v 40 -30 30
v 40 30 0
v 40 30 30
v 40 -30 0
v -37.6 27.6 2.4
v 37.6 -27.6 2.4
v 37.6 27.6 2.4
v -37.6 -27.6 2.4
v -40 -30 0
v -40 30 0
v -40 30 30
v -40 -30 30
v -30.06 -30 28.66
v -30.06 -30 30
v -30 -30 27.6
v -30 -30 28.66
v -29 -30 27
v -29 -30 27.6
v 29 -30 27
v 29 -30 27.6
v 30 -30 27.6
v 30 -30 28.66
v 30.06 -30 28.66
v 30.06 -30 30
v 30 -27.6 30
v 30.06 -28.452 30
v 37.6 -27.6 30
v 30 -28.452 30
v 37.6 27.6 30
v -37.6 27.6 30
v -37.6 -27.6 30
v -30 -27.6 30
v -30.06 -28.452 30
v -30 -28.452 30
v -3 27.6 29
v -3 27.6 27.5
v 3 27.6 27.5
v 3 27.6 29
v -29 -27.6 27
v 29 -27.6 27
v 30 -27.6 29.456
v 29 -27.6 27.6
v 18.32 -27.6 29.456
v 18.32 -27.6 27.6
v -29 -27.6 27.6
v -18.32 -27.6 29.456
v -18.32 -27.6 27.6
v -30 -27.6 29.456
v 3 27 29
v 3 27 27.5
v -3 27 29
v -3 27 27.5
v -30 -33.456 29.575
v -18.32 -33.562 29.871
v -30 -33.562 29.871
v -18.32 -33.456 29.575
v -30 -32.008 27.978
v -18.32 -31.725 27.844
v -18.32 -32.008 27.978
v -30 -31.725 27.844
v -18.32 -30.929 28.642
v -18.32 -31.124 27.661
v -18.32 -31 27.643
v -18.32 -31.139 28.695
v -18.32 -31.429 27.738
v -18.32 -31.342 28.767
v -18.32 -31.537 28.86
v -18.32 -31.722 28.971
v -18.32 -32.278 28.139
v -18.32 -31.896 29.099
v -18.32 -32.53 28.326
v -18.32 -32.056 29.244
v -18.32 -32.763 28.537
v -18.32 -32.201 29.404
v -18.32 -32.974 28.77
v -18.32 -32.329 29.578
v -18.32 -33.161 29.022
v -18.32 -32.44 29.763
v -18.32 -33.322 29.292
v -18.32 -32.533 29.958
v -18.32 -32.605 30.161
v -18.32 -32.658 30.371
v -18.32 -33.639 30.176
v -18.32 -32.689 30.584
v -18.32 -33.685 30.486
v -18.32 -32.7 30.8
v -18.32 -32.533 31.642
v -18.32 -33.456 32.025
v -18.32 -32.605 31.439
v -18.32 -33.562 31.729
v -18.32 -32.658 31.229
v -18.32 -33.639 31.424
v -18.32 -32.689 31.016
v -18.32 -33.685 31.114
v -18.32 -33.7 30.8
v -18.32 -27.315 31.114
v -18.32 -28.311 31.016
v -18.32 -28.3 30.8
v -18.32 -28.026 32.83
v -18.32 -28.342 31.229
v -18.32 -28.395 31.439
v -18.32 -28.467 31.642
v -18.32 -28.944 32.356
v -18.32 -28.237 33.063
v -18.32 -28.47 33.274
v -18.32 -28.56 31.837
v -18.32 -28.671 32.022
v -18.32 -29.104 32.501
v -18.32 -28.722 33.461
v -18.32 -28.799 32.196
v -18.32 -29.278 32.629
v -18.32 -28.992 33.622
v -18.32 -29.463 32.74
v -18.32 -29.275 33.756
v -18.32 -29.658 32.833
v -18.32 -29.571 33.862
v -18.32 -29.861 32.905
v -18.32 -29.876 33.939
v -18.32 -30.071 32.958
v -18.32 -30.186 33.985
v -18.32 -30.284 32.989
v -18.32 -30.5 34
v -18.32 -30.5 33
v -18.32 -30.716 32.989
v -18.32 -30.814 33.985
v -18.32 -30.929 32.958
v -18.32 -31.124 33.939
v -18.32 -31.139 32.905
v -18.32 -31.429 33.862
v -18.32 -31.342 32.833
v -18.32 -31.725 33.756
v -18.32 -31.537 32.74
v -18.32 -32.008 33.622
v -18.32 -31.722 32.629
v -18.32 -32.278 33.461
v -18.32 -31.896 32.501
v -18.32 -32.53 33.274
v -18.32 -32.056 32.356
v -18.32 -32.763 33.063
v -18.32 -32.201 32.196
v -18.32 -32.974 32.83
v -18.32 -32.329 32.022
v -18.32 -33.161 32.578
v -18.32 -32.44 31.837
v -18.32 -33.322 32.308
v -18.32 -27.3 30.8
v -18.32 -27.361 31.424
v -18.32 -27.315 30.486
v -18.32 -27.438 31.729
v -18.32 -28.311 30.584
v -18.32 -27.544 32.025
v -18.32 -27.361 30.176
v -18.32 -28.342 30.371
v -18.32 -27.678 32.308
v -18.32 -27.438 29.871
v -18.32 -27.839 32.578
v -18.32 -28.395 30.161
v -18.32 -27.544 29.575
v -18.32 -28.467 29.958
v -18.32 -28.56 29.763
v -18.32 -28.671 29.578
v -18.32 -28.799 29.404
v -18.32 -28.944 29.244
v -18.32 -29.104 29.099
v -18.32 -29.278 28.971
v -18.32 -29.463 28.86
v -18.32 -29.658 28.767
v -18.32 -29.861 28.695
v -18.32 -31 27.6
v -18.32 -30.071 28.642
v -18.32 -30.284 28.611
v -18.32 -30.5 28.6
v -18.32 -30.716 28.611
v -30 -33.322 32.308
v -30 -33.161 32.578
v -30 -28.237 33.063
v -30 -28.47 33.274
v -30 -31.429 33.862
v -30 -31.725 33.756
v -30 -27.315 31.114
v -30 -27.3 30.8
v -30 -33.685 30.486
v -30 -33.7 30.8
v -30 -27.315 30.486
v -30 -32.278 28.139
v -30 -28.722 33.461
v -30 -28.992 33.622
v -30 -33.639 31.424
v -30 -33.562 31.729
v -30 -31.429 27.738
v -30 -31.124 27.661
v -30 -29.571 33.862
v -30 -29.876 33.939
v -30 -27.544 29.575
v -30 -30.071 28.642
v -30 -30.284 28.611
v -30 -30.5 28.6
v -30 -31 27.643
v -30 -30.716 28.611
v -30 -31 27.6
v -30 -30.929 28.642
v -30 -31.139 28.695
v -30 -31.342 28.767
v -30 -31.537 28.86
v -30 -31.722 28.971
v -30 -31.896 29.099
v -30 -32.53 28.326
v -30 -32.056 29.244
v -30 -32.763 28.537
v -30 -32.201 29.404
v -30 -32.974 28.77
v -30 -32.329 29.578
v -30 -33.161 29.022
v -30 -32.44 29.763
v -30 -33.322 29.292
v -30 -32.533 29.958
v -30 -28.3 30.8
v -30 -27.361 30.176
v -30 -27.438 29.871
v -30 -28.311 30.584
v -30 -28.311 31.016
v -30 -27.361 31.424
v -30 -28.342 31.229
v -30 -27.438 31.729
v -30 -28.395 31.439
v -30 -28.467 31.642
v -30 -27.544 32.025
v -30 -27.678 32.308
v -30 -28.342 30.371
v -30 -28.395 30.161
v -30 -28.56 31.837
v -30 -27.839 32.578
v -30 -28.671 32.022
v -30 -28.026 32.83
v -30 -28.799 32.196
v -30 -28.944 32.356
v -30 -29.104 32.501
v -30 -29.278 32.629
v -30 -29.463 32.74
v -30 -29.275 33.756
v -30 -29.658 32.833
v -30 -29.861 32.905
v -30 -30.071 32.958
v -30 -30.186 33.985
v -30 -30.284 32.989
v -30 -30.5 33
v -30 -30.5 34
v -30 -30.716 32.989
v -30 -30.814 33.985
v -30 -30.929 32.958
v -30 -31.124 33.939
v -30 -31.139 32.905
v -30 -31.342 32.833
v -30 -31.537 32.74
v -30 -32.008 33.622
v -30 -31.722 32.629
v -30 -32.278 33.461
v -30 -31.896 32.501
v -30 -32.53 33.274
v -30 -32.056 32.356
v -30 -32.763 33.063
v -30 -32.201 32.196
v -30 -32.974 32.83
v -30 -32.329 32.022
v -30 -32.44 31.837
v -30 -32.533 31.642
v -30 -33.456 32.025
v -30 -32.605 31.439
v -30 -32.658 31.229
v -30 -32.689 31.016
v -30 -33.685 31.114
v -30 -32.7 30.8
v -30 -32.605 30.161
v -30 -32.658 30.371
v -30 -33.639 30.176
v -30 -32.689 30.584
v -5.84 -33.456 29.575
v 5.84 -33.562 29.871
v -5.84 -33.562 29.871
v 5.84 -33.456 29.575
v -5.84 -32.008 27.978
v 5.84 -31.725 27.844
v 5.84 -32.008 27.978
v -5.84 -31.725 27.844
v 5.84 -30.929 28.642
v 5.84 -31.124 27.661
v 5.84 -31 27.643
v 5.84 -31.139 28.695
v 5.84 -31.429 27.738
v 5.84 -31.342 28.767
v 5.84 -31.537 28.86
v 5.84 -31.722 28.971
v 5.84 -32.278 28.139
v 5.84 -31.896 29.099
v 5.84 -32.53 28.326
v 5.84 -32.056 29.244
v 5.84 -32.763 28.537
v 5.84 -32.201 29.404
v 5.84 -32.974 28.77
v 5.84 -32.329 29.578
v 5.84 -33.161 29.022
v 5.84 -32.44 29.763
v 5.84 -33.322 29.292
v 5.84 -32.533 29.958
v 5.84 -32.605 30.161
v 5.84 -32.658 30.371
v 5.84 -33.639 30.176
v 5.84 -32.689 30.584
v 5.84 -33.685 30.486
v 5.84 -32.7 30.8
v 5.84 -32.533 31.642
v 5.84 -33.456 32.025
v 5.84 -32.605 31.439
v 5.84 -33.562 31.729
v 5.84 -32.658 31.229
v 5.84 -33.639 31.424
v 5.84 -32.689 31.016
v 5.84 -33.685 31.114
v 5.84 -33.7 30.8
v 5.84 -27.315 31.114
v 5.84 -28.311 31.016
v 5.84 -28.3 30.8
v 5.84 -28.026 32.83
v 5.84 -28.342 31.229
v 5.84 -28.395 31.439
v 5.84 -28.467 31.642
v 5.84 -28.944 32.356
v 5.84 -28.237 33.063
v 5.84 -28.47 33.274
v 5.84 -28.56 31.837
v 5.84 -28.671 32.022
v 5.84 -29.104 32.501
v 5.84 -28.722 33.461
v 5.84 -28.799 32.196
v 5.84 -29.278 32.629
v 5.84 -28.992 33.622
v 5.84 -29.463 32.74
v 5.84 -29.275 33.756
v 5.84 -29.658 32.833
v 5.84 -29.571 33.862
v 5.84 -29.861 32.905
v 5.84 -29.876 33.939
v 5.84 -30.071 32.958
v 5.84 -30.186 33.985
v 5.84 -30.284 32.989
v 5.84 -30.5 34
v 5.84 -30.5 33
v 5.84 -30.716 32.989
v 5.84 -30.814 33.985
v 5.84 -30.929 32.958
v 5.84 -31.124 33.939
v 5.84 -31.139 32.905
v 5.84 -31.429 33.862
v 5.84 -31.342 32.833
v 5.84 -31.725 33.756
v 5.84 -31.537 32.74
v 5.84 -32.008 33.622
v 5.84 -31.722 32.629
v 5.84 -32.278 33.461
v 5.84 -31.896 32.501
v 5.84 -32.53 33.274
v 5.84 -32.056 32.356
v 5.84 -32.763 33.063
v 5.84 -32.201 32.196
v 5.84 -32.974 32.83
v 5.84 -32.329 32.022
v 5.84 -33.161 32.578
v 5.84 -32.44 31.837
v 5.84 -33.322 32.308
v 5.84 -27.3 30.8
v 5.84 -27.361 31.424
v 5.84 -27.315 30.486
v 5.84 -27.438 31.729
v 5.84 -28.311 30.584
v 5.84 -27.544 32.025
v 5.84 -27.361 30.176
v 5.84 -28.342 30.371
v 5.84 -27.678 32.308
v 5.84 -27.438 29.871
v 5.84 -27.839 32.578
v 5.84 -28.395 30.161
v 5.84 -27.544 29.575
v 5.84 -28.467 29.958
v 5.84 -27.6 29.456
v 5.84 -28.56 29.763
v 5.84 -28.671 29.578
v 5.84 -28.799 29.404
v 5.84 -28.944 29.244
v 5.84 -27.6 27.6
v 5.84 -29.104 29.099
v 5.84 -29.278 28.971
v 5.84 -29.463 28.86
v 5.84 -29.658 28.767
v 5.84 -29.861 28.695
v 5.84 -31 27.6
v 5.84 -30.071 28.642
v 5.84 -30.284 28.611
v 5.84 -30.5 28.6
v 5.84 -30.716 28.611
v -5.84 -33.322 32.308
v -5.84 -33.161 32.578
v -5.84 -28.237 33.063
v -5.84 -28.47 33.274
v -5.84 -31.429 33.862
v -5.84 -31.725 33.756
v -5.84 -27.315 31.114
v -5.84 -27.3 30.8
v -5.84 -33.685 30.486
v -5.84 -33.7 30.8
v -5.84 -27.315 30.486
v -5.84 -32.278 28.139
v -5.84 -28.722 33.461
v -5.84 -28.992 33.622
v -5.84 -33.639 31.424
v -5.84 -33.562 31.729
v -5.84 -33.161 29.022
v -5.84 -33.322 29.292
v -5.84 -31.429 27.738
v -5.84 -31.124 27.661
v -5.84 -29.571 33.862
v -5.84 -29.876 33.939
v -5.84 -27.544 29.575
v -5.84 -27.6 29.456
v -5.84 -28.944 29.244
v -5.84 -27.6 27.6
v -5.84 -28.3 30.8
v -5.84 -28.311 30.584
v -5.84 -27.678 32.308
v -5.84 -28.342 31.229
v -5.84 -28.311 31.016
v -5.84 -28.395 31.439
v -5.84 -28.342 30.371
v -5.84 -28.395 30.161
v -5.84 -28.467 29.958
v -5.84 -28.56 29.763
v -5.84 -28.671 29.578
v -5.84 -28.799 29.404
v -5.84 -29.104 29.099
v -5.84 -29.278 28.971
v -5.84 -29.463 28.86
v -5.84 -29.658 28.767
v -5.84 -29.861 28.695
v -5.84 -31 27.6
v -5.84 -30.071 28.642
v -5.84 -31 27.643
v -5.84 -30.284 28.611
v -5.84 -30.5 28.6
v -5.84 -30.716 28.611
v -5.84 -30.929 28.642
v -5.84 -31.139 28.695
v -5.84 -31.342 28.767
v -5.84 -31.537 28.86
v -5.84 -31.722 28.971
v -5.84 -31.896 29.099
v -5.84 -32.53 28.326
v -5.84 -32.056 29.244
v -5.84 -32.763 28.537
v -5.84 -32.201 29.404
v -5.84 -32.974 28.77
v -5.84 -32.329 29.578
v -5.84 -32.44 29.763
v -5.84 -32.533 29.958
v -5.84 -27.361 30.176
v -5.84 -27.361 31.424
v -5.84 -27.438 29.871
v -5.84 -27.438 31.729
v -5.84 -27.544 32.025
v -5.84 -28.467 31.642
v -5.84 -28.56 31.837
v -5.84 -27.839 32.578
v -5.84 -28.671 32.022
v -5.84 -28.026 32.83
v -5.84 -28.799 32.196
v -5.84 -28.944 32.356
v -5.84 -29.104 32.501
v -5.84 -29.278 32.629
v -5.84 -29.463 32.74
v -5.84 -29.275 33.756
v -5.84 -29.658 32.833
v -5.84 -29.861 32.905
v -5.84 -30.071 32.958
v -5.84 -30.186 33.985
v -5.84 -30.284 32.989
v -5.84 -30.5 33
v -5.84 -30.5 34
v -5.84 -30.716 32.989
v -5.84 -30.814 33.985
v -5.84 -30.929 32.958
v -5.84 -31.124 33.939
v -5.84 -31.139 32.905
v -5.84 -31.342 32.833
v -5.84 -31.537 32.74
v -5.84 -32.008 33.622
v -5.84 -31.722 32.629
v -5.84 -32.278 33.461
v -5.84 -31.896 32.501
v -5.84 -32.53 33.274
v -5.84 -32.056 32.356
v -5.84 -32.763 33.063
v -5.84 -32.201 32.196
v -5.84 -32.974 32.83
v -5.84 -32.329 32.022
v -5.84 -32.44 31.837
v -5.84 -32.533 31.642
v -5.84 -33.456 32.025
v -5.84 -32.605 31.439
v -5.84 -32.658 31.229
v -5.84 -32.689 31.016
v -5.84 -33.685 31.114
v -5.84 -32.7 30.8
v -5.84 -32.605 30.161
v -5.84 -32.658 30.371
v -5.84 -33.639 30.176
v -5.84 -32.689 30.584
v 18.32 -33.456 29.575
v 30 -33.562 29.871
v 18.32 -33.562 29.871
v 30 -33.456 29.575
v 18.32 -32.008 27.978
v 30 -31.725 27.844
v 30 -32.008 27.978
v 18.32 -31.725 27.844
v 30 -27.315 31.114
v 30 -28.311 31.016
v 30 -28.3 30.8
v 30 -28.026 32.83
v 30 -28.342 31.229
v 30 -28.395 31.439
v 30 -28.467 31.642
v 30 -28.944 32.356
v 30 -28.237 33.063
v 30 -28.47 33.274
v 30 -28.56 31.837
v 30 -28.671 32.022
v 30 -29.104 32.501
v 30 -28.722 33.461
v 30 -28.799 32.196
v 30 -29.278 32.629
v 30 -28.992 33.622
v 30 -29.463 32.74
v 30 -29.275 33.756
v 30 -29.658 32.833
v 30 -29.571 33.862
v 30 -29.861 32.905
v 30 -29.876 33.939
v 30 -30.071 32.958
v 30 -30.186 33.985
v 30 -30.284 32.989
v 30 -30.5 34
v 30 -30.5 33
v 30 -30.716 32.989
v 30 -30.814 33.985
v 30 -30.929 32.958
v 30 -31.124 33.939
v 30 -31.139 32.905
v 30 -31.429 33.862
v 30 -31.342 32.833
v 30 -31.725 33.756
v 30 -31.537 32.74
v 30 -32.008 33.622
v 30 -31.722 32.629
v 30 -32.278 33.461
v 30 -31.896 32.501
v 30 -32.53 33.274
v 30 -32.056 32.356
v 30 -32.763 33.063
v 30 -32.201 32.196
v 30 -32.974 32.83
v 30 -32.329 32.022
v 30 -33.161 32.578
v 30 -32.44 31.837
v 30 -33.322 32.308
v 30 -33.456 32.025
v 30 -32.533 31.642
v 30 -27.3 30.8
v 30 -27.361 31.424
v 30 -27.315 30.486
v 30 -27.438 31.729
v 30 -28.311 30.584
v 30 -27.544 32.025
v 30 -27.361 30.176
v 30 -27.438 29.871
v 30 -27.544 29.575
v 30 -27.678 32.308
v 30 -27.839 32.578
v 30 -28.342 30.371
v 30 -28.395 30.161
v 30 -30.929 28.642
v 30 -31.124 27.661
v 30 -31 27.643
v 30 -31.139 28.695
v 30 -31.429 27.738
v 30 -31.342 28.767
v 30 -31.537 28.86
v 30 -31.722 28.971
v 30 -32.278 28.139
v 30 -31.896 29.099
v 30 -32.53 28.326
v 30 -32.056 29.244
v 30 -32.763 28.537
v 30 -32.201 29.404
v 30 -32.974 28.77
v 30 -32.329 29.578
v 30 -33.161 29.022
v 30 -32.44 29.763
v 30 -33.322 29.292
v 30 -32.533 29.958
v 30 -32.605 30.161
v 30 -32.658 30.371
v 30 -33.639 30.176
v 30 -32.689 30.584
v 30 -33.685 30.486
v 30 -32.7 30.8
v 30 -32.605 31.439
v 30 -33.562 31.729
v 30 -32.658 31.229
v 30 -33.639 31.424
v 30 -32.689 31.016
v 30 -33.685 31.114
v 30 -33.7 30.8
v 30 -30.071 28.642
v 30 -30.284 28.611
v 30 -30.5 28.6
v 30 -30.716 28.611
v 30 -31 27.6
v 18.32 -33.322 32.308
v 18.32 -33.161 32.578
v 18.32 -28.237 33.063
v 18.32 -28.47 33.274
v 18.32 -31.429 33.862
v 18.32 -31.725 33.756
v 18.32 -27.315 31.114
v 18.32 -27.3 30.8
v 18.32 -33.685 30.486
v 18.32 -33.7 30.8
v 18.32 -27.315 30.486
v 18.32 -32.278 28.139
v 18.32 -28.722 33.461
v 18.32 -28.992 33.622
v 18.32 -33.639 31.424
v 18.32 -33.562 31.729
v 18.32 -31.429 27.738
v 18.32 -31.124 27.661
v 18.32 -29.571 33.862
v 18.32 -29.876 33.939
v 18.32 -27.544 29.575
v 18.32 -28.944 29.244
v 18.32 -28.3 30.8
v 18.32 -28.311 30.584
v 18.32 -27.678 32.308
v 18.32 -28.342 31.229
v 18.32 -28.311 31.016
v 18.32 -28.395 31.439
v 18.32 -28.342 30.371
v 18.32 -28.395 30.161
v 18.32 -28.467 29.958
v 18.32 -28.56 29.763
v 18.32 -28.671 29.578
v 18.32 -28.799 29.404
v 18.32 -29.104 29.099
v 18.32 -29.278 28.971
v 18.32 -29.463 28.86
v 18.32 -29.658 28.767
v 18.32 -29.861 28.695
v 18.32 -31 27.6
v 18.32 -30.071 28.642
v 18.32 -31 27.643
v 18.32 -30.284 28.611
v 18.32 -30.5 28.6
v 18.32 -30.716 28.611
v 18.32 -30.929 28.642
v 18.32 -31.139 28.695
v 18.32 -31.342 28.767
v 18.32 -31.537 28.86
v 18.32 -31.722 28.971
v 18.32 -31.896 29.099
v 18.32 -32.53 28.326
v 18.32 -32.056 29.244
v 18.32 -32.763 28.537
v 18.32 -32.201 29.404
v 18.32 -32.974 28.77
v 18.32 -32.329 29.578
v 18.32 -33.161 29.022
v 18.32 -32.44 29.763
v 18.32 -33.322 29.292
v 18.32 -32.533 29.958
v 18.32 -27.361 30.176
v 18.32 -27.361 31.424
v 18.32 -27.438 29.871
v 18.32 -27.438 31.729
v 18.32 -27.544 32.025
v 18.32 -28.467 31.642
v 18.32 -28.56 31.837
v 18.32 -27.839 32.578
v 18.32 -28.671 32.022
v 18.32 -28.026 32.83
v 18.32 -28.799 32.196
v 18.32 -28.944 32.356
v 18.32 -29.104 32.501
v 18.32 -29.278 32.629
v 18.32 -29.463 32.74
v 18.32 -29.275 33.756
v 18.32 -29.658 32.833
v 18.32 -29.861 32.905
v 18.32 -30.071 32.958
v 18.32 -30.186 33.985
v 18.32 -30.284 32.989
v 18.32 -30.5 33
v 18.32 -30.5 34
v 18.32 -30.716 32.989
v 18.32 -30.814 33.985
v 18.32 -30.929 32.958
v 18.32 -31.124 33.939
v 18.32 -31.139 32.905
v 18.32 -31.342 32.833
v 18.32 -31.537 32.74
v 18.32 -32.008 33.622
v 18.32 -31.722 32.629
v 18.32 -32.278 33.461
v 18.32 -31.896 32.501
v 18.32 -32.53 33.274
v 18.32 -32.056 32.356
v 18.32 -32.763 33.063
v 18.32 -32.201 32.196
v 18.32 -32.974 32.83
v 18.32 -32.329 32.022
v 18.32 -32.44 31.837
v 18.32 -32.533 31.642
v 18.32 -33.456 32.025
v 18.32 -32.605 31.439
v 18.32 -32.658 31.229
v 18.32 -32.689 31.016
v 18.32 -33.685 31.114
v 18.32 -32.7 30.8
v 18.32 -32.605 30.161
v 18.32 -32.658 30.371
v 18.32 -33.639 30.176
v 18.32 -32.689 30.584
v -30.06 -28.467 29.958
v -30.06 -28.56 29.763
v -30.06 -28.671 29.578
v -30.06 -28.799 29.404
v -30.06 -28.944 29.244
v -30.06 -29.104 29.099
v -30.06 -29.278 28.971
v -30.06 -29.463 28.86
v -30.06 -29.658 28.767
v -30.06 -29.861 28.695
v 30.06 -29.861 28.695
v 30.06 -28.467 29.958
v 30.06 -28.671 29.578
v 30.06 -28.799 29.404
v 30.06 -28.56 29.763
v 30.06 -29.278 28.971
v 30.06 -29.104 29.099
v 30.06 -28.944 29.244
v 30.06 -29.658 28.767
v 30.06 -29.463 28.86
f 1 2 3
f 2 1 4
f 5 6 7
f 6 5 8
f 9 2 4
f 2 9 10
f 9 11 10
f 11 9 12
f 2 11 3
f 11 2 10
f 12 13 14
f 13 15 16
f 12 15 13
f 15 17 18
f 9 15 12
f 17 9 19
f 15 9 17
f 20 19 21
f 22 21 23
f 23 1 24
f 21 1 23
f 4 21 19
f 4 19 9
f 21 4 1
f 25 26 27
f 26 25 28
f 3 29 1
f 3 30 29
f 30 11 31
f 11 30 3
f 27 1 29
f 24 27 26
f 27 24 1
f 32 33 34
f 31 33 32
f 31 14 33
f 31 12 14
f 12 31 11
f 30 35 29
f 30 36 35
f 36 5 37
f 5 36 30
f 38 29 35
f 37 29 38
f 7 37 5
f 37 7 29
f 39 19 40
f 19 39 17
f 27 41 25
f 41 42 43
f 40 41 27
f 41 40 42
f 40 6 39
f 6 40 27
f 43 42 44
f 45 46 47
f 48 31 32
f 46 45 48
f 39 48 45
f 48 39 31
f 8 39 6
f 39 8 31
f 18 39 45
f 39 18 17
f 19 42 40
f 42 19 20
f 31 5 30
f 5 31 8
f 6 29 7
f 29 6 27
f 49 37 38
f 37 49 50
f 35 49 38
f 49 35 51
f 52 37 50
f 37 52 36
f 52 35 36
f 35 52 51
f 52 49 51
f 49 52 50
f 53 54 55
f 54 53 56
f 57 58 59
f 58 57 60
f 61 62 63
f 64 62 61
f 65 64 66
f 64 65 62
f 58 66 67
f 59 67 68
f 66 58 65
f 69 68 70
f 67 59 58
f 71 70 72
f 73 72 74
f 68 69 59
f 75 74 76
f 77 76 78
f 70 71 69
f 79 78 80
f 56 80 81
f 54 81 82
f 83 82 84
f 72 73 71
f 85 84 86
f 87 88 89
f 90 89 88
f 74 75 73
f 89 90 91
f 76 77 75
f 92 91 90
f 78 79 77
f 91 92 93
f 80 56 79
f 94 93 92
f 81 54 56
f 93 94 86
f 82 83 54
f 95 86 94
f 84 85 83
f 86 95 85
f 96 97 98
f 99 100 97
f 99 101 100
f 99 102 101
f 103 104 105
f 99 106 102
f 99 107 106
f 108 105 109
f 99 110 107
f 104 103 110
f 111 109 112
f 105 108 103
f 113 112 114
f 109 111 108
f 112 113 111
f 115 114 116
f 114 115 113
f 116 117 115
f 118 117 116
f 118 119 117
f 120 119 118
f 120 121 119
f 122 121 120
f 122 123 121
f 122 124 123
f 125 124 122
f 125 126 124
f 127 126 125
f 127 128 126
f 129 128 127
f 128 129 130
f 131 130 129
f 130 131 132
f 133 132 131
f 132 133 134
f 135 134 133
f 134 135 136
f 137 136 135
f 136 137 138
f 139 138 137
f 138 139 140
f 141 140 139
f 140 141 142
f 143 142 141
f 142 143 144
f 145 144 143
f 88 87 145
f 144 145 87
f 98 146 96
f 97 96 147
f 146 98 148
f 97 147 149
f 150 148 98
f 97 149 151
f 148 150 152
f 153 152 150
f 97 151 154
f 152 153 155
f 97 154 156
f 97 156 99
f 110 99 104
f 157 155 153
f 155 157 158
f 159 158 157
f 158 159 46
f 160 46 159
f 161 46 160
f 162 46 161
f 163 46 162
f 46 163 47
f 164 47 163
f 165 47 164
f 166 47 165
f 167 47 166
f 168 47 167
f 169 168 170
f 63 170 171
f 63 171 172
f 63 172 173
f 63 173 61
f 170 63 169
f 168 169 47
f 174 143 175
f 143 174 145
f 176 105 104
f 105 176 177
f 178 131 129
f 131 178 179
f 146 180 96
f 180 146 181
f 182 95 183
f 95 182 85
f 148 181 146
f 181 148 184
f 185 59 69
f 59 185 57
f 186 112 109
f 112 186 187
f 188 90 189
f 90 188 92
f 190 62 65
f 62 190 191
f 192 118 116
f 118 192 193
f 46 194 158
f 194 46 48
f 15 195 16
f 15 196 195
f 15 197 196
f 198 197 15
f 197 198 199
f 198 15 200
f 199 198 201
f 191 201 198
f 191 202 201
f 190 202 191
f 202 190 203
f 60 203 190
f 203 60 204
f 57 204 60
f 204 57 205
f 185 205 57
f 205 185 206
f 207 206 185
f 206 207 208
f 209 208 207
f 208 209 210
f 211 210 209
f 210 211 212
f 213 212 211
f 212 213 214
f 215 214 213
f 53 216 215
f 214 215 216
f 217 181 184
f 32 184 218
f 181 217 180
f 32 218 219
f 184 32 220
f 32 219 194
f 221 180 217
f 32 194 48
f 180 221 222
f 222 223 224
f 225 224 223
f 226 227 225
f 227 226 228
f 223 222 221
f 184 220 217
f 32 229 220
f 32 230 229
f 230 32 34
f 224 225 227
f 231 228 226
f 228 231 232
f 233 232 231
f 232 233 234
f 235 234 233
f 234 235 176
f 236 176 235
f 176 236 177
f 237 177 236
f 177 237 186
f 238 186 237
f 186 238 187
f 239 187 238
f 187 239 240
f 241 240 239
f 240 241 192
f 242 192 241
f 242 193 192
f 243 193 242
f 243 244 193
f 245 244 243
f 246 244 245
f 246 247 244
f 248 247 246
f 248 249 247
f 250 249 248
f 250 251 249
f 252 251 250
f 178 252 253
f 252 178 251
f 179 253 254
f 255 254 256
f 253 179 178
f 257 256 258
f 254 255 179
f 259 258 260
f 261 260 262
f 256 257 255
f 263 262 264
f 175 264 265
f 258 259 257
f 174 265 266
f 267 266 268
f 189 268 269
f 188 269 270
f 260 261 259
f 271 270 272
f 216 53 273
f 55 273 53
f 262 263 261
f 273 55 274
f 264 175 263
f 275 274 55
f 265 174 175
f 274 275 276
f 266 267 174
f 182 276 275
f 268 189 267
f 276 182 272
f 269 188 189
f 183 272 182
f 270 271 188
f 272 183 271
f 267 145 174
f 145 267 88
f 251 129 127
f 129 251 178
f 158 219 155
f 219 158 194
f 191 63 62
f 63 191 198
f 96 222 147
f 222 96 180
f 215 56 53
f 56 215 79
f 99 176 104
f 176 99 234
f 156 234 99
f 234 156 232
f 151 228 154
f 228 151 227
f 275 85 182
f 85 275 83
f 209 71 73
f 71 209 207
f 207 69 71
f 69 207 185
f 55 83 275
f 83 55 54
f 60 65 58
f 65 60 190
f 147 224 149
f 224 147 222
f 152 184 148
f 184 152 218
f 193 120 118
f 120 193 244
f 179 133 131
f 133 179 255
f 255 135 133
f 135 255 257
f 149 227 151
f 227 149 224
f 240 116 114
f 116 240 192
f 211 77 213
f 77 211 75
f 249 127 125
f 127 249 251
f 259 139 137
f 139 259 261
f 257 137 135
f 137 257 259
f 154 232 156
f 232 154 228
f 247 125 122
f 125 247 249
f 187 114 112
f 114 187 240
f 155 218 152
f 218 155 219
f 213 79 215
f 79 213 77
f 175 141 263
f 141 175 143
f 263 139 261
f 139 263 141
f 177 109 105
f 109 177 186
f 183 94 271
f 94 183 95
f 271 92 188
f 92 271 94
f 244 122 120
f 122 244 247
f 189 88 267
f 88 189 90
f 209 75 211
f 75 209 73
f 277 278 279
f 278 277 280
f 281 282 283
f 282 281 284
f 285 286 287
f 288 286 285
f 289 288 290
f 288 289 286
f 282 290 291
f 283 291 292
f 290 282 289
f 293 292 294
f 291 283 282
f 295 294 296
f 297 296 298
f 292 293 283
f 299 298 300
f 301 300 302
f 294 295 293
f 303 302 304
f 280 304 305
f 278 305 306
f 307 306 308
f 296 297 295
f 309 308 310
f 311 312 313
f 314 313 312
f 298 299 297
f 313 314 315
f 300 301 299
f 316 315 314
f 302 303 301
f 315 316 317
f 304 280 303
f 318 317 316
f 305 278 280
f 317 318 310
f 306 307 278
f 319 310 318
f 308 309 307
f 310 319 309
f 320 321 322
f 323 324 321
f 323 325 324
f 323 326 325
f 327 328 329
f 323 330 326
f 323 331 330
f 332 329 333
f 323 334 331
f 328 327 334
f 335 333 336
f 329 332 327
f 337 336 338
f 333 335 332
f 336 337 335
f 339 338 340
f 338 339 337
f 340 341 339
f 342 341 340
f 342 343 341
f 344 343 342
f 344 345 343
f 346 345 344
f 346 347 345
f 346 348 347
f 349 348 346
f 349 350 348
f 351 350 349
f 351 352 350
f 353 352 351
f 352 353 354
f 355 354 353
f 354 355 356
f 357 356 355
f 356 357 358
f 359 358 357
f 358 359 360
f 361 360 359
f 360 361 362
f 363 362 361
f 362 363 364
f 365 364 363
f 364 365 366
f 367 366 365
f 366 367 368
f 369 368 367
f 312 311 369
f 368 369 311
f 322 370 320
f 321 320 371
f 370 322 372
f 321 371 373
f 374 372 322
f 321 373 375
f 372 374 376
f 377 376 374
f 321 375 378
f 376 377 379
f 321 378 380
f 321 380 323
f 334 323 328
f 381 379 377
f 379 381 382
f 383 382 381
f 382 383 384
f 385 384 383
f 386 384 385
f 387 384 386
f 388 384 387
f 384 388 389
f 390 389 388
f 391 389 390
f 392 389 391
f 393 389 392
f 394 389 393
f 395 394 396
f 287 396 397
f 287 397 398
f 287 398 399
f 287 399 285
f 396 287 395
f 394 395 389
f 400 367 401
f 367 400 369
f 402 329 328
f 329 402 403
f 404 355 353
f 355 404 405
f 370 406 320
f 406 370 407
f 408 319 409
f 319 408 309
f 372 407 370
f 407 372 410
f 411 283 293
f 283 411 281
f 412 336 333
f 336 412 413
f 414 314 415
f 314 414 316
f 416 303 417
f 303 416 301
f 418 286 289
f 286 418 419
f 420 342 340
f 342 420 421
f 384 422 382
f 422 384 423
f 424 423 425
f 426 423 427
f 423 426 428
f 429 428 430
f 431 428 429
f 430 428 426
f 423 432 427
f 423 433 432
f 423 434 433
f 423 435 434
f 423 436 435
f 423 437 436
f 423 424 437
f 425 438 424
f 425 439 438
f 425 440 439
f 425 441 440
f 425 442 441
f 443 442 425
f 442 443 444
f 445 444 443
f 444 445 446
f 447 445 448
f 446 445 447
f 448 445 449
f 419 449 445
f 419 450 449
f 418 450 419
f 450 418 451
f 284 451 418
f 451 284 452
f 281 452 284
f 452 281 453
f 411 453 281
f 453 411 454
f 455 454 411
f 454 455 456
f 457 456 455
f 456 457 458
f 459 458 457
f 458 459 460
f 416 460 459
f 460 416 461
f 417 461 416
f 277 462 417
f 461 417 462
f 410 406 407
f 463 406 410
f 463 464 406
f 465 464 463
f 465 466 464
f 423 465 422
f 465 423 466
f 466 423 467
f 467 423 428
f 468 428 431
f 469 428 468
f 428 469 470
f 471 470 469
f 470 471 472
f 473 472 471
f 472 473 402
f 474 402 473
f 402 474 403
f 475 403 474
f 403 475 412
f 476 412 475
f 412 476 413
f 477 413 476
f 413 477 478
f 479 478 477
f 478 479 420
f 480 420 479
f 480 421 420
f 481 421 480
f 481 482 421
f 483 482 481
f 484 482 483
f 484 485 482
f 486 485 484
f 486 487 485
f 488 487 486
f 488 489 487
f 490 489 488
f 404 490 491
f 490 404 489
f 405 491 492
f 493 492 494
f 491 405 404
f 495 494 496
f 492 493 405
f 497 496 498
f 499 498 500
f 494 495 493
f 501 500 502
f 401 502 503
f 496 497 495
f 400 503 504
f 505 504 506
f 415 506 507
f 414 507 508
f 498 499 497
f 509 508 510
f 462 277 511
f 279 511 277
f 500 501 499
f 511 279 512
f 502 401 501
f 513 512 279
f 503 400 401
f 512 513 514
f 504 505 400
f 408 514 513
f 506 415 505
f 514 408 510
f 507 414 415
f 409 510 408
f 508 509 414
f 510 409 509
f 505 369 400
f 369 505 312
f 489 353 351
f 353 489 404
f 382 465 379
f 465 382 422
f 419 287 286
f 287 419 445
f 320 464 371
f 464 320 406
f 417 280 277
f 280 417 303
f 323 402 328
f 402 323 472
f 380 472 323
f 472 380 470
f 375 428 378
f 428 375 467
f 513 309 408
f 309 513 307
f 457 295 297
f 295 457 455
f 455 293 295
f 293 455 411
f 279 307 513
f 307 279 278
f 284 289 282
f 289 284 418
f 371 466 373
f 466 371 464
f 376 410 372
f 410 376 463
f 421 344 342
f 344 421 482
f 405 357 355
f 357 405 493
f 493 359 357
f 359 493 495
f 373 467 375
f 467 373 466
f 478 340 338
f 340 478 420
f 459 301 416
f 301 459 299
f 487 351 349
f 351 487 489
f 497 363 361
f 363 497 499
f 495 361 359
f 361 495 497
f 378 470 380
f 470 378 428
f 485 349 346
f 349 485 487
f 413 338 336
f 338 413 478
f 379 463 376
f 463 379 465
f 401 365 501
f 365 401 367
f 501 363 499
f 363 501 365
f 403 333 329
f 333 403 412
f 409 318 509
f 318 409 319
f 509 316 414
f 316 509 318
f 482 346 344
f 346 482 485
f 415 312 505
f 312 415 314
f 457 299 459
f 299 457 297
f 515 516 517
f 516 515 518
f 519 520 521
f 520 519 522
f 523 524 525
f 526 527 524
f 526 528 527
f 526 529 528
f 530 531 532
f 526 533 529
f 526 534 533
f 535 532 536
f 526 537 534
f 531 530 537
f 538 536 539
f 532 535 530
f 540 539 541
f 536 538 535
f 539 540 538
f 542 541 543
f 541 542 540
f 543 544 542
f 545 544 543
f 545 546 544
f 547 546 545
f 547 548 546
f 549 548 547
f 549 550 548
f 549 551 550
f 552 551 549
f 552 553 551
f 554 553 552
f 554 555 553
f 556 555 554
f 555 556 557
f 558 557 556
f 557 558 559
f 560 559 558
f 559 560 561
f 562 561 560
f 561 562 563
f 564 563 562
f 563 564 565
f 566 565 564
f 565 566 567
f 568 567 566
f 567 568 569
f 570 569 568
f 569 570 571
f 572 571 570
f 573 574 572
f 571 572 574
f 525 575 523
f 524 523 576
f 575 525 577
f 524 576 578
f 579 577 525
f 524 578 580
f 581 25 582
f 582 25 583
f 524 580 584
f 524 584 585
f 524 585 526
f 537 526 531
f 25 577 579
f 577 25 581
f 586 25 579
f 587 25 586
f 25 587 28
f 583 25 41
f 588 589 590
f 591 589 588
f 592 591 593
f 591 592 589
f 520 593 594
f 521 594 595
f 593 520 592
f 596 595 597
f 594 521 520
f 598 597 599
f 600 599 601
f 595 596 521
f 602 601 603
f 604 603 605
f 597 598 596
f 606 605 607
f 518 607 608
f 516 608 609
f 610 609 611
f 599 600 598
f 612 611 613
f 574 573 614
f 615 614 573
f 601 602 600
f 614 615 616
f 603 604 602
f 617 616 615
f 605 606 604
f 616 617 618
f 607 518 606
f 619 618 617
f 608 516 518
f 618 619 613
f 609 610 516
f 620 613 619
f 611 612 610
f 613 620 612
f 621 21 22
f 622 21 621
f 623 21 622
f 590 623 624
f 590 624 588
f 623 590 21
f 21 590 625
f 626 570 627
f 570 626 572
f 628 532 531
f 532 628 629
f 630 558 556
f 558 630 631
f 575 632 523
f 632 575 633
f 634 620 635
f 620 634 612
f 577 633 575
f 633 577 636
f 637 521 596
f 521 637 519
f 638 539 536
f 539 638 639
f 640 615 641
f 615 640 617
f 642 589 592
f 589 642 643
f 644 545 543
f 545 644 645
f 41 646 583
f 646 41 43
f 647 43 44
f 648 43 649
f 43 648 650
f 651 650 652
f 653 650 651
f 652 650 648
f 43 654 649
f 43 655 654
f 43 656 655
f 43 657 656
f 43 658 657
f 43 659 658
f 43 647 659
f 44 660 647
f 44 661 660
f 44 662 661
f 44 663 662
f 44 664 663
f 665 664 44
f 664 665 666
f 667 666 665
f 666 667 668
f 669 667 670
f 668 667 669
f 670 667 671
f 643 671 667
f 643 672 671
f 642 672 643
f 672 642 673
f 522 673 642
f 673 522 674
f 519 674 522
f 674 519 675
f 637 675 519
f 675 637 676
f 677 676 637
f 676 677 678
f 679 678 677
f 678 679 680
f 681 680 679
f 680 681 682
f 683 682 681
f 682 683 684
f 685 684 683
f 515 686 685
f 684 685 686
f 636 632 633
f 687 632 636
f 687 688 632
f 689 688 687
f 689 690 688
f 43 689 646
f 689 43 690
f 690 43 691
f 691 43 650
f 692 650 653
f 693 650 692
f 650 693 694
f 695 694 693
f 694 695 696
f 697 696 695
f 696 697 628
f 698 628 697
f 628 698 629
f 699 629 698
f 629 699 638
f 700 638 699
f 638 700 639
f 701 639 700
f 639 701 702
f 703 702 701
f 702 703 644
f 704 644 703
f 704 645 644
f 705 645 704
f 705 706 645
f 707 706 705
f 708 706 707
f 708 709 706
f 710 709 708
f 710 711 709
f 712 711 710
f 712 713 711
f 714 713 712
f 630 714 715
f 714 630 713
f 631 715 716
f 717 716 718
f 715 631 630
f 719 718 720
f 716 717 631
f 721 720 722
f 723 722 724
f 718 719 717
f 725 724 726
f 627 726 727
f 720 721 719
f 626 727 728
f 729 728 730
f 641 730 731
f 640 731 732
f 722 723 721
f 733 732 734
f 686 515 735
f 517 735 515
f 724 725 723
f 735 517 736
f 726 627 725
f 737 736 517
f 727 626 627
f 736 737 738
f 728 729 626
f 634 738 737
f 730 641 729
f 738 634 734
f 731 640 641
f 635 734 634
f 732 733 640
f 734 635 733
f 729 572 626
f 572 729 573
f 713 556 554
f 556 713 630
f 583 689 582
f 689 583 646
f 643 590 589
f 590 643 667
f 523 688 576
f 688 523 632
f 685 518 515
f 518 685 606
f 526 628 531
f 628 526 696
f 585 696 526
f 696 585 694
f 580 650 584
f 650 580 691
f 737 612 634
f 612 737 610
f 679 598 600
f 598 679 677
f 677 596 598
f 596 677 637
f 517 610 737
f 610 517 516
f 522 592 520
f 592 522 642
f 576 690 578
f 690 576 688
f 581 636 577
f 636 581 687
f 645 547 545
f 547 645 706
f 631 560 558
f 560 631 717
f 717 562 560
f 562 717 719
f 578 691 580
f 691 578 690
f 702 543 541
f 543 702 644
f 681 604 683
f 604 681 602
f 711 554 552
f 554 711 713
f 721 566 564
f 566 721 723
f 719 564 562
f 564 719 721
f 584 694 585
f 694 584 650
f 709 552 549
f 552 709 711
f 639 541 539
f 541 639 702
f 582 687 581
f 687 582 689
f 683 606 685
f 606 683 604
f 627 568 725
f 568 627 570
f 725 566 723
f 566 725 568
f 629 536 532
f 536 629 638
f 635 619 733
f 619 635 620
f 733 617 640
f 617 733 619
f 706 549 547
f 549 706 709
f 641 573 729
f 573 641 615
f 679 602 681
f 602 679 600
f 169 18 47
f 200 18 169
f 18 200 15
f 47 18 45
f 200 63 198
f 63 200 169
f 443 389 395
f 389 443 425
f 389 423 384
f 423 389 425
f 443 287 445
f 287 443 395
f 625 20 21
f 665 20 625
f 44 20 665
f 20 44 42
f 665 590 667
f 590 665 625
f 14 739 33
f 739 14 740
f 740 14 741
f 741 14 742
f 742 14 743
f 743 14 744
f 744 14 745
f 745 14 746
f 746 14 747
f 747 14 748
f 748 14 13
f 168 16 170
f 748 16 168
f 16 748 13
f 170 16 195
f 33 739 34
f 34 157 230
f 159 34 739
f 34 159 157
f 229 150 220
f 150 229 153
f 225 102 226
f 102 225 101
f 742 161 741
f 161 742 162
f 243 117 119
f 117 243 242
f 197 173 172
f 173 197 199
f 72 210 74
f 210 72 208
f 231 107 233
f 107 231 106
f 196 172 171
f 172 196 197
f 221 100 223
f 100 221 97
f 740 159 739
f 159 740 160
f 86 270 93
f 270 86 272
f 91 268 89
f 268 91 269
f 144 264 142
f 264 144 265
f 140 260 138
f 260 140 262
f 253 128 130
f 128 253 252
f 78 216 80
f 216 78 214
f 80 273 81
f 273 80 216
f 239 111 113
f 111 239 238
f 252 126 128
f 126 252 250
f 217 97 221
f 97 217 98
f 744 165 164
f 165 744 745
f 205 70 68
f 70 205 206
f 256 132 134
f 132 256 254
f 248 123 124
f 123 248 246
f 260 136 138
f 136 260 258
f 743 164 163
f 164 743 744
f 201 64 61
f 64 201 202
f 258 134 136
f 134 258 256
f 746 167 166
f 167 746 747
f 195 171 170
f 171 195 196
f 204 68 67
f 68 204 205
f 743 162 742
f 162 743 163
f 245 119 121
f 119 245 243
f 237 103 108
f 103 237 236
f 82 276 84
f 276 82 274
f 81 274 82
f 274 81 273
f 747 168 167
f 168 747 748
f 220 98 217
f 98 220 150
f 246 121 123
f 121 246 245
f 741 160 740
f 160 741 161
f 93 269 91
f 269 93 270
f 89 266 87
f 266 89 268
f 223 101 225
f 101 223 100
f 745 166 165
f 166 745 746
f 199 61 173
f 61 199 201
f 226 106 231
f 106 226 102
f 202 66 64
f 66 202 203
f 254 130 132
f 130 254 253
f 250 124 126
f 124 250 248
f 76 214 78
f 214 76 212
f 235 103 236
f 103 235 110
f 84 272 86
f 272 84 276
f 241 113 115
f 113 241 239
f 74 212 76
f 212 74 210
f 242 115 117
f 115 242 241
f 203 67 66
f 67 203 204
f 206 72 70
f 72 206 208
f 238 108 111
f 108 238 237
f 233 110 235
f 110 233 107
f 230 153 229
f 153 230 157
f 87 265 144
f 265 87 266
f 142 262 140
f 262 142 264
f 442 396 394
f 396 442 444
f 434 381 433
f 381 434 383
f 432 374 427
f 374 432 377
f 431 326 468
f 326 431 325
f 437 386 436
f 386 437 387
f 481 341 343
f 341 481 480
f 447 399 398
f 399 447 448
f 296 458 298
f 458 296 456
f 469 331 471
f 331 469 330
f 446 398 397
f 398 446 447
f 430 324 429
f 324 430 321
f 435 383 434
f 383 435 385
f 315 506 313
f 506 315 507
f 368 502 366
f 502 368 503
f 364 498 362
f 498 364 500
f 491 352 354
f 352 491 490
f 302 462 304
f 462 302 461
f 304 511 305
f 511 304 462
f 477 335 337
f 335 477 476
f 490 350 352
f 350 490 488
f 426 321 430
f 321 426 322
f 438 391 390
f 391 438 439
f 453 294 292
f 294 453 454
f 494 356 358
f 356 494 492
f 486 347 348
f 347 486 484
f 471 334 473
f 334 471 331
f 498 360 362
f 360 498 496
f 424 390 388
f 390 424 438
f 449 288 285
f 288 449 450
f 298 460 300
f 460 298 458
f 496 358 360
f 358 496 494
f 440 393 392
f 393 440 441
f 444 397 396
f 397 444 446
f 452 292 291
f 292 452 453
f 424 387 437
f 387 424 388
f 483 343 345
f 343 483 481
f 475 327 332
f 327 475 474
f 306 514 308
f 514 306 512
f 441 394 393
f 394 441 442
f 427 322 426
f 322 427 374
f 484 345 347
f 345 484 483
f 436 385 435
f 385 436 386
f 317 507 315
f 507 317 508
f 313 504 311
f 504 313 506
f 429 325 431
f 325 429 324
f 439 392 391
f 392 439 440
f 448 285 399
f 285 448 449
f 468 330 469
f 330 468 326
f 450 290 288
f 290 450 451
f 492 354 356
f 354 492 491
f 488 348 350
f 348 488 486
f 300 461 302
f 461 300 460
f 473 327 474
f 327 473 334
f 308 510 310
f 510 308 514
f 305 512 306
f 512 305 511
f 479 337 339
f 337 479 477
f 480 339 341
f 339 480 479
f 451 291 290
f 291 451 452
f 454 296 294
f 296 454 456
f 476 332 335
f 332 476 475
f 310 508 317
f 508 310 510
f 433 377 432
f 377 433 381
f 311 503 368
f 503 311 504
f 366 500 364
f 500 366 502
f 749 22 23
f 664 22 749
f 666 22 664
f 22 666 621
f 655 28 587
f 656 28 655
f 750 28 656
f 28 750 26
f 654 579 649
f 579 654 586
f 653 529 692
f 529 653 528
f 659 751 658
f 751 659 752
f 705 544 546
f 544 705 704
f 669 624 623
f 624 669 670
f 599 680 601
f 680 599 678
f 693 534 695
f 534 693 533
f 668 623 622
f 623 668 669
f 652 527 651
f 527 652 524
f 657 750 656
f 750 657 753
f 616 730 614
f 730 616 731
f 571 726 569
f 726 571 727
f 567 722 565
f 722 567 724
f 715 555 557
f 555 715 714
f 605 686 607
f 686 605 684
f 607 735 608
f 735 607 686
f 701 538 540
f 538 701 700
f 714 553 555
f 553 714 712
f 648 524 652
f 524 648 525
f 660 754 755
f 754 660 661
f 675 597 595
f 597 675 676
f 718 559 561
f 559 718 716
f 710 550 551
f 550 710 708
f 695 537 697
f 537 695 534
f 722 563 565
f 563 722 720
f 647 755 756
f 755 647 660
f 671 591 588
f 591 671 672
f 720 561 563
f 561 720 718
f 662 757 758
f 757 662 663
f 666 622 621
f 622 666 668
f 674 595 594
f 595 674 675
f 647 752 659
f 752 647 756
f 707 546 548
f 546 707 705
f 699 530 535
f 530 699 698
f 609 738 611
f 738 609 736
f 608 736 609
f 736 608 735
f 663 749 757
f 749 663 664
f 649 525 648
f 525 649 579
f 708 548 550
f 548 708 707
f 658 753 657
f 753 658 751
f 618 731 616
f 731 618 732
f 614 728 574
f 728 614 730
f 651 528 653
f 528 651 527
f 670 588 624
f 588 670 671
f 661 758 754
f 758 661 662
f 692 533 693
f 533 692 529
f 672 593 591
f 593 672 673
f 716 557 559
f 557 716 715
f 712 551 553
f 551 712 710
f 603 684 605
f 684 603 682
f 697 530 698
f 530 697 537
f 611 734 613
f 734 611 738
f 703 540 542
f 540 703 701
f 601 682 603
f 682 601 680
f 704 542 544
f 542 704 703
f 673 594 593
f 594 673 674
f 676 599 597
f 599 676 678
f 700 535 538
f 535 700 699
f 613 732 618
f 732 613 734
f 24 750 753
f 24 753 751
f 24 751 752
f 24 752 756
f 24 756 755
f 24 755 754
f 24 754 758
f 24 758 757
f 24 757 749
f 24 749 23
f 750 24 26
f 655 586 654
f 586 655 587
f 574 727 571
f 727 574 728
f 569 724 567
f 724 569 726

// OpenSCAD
// Box with print-in-place hinge (v3: global bore subtraction, hinge cutouts)
part = "box";
cadverify_only = "";
module instance(name, part, unit = 1) {
    echo(cadverify_instance = [name, part, unit]);
    if (cadverify_only == "" || cadverify_only == name) children();
}

Rkn = 3.2; rbore = 2.2; rpin = 1.9;
yh = -30.5; zh = 30.8;
lid_zh = 3.4;
lid_lift = 27.4;
pin_lift_z = 27.8; pin_shift_y = -30.5;
k0x0=-30; k0x1=-18.32;
k1x0=-17.92; k1x1=-6.24;
k2x0=-5.84; k2x1=5.84;
k3x0=6.24; k3x1=17.92;
k4x0=18.32; k4x1=30;

$fn = 64;

module xcyl(x0, x1, r, y, z) {
    translate([x0, y, z]) rotate([0, 90, 0]) cylinder(r = r, h = x1 - x0);
}

module box_part() {
    difference() {
        union() {
            translate([-40, -30, 0]) cube([80, 60, 2.4]);
            translate([-40, 27.6, 2.4]) cube([80, 2.4, 27.6]);
            translate([-40, -30, 2.4]) cube([80, 2.4, 24.6]);
            translate([-40, -30, 27.0]) cube([11, 2.4, 3.0]);
            translate([29, -30, 27.0]) cube([11, 2.4, 3.0]);
            translate([-40, -27.6, 2.4]) cube([2.4, 55.2, 27.6]);
            translate([37.6, -27.6, 2.4]) cube([2.4, 55.2, 27.6]);
            translate([-3, 27.0, 27.5]) cube([6, 0.6, 1.5]);
            xcyl(k0x0, k0x1, Rkn, yh, zh);
            xcyl(k2x0, k2x1, Rkn, yh, zh);
            xcyl(k4x0, k4x1, Rkn, yh, zh);
            translate([k0x0, -31, 27.6]) cube([k0x1-k0x0, 3.4, 3.2]);
            translate([k2x0, -31, 27.6]) cube([k2x1-k2x0, 3.4, 3.2]);
            translate([k4x0, -31, 27.6]) cube([k4x1-k4x0, 3.4, 3.2]);
        }
        xcyl(k0x0-0.06, k0x1+0.06, rbore, yh, zh);
        xcyl(k2x0-0.06, k2x1+0.06, rbore, yh, zh);
        xcyl(k4x0-0.06, k4x1+0.06, rbore, yh, zh);
    }
}

module lid_part() {
    difference() {
        union() {
            translate([-40, -30, 10.6]) cube([80, 60, 2.4]);
            translate([-40, 27.6, 3]) cube([80, 2.4, 7.6]);
            translate([k1x0, -30, 3]) cube([k1x1-k1x0, 2.4, 7.6]);
            translate([k3x0, -30, 3]) cube([k3x1-k3x0, 2.4, 7.6]);
            translate([-40, -30, 3]) cube([10, 2.4, 7.6]);
            translate([30, -30, 3]) cube([10, 2.4, 7.6]);
            translate([-40, -27.6, 3]) cube([2.4, 55.2, 7.6]);
            translate([37.6, -27.6, 3]) cube([2.4, 55.2, 7.6]);
            translate([-37.2, 25.2, 0]) cube([74.4, 2.0, 10.6]);
            translate([-37.2, -27.2, 0]) cube([74.4, 2.0, 10.6]);
            translate([-37.2, -25.2, 0]) cube([2.0, 50.4, 10.6]);
            translate([35.2, -25.2, 0]) cube([2.0, 50.4, 10.6]);
            xcyl(k1x0, k1x1, Rkn, yh, lid_zh);
            xcyl(k3x0, k3x1, Rkn, yh, lid_zh);
            translate([k1x0, -31, 0]) cube([k1x1-k1x0, 3.4, 5]);
            translate([k3x0, -31, 0]) cube([k3x1-k3x0, 3.4, 5]);
        }
        xcyl(k1x0-0.06, k1x1+0.06, rbore, yh, lid_zh);
        xcyl(k3x0-0.06, k3x1+0.06, rbore, yh, lid_zh);
        translate([-3.3, 26.3, -0.05]) cube([6.6, 1.5, 2.05]);
    }
}

module pin_part() {
    union() {
        xcyl(-32.4, 32.4, rpin, 0, 3);
        xcyl(30.4, 32.4, 3, 0, 3);
        xcyl(-32.4, -30.4, 3, 0, 3);
    }
}

if (part == "box") {
    echo(cadverify_spec = [
        ["bounds", [[-40, -33.7, 0], [40, 30, 34.0]]],
        ["bodies", 1],
        ["through_holes", 3],
        ["support_faces", [["bed", "-z", 4000]]],
        ["overhangs_allowed", [["hinge knuckles, bores and wall cutouts print in place", [[-30.2, -33.9, 26.5], [30.2, -27.1, 33.5]]]]],
        ["copies", 1],
        ["details", [
            ["floor", "thickness", [0, 0, -1], [0, 0, 1], 2.4],
            ["front_wall", "thickness", [0, 31, 15], [0, -1, 0], 2.4],
            ["cavity", "void", [[-37.6, -27.6, 2.4], [37.6, 27.6, 29.9]], 0.9],
            ["hinge_bore", "hole", [-31, -30.5, 30.8], [1, 0, 0], [[0, 4.4], [11.6, 4.4]]],
            ["catch_bump", "material", [[-3, 27.0, 27.5], [3, 27.6, 29.0]], 0.9],
            ["hinge_view", "view", [[-30, -34, 26.5], [30, -27, 34.5]]]
        ]]
    ]);
    box_part();
} else if (part == "lid") {
    echo(cadverify_spec = [
        ["bounds", [[-40, -33.7, 0], [40, 30, 13]]],
        ["bodies", 1],
        ["through_holes", 2],
        ["support_faces", [["bed", "-z", 300]]],
        ["overhangs_allowed", [
            ["hinge knuckles and bores print in place", [[-18.2, -33.9, 0], [18.2, -27.1, 4.2]]],
            ["skirt cutout top bridges", [[-30.2, -30.2, 6.5], [30.2, -27.4, 7.5]]],
            ["lid top bridging over plug cavity", [[-37.2, -24.9, 10.1], [37.2, 25.2, 11.1]]]
        ]],
        ["copies", 1],
        ["details", [
            ["top", "thickness", [0, 0, 14], [0, 0, -1], 2.4],
            ["skirt", "thickness", [0, 31, 6], [0, -1, 0], 2.4],
            ["plug_cavity", "void", [[-35.2, -24.9, 0], [35.2, 25.2, 10.5]], 0.9],
            ["hinge_bore", "hole", [-18.6, -30.5, 3.4], [1, 0, 0], [[0, 4.4], [11.6, 4.4]]],
            ["catch_notch", "void", [[-3.3, 26.3, 0], [3.3, 27.8, 2.0]], 0.9],
            ["catch_view", "view", [[-5, 26, 0], [5, 28.5, 3]]]
        ]]
    ]);
    lid_part();
} else if (part == "pin") {
    echo(cadverify_spec = [
        ["bounds", [[-32.4, -3, 0], [32.4, 3, 6]]],
        ["bodies", 1],
        ["support_faces", []],
        ["overhangs_allowed", [["pin shaft underside bridges with 0.3 gap", [[-32.4, -1.9, 0], [32.4, 1.9, 1.6]]]]],
        ["copies", 1],
        ["details", [
            ["shaft", "thickness", [0, 3, 3], [0, -1, 0], 3.8],
            ["head", "material", [[30.4, -3, 0], [32.4, 3, 6]], 0.7],
            ["pin_view", "view", [[-32.4, -3, 0], [32.4, 3, 6]]]
        ]]
    ]);
    pin_part();
} else if (part == "assembly") {
    echo(cadverify_spec = [
        ["bounds", [[-40, -33.7, 0], [40, 30, 40.4]]],
        ["support_faces", [["bed", "-z", 4000]]],
        ["allowed_interferences", []],
        ["motions", [
            ["lid_open", ["lid"], "rotate", [0, -30.5, 30.8], [1, 0, 0], [0, 110], ["flex", [["lid", "box", 0.5, "catch bump clearance pass"]]]]
        ]],
        ["assembly_order", [
            [["box"], [0, 0, 0]],
            [["lid"], [0, 0, -1]],
            [["pin"], [1, 0, 0]]
        ]],
        ["print_in_place", 0.3],
        ["overhangs_allowed", [
            ["hinge undersides, pin bridge and cutouts in place", [[-33, -34, 26.5], [33, -27, 34.8]]],
            ["lid top bridging over box cavity", [[-37.2, -24.9, 37.5], [37.2, 25.2, 38.5]]]
        ]]
    ]);
    instance("box", "box") box_part();
    instance("lid", "lid") translate([0, 0, lid_lift]) lid_part();
    instance("pin", "pin") translate([0, pin_shift_y, pin_lift_z]) pin_part();
}
